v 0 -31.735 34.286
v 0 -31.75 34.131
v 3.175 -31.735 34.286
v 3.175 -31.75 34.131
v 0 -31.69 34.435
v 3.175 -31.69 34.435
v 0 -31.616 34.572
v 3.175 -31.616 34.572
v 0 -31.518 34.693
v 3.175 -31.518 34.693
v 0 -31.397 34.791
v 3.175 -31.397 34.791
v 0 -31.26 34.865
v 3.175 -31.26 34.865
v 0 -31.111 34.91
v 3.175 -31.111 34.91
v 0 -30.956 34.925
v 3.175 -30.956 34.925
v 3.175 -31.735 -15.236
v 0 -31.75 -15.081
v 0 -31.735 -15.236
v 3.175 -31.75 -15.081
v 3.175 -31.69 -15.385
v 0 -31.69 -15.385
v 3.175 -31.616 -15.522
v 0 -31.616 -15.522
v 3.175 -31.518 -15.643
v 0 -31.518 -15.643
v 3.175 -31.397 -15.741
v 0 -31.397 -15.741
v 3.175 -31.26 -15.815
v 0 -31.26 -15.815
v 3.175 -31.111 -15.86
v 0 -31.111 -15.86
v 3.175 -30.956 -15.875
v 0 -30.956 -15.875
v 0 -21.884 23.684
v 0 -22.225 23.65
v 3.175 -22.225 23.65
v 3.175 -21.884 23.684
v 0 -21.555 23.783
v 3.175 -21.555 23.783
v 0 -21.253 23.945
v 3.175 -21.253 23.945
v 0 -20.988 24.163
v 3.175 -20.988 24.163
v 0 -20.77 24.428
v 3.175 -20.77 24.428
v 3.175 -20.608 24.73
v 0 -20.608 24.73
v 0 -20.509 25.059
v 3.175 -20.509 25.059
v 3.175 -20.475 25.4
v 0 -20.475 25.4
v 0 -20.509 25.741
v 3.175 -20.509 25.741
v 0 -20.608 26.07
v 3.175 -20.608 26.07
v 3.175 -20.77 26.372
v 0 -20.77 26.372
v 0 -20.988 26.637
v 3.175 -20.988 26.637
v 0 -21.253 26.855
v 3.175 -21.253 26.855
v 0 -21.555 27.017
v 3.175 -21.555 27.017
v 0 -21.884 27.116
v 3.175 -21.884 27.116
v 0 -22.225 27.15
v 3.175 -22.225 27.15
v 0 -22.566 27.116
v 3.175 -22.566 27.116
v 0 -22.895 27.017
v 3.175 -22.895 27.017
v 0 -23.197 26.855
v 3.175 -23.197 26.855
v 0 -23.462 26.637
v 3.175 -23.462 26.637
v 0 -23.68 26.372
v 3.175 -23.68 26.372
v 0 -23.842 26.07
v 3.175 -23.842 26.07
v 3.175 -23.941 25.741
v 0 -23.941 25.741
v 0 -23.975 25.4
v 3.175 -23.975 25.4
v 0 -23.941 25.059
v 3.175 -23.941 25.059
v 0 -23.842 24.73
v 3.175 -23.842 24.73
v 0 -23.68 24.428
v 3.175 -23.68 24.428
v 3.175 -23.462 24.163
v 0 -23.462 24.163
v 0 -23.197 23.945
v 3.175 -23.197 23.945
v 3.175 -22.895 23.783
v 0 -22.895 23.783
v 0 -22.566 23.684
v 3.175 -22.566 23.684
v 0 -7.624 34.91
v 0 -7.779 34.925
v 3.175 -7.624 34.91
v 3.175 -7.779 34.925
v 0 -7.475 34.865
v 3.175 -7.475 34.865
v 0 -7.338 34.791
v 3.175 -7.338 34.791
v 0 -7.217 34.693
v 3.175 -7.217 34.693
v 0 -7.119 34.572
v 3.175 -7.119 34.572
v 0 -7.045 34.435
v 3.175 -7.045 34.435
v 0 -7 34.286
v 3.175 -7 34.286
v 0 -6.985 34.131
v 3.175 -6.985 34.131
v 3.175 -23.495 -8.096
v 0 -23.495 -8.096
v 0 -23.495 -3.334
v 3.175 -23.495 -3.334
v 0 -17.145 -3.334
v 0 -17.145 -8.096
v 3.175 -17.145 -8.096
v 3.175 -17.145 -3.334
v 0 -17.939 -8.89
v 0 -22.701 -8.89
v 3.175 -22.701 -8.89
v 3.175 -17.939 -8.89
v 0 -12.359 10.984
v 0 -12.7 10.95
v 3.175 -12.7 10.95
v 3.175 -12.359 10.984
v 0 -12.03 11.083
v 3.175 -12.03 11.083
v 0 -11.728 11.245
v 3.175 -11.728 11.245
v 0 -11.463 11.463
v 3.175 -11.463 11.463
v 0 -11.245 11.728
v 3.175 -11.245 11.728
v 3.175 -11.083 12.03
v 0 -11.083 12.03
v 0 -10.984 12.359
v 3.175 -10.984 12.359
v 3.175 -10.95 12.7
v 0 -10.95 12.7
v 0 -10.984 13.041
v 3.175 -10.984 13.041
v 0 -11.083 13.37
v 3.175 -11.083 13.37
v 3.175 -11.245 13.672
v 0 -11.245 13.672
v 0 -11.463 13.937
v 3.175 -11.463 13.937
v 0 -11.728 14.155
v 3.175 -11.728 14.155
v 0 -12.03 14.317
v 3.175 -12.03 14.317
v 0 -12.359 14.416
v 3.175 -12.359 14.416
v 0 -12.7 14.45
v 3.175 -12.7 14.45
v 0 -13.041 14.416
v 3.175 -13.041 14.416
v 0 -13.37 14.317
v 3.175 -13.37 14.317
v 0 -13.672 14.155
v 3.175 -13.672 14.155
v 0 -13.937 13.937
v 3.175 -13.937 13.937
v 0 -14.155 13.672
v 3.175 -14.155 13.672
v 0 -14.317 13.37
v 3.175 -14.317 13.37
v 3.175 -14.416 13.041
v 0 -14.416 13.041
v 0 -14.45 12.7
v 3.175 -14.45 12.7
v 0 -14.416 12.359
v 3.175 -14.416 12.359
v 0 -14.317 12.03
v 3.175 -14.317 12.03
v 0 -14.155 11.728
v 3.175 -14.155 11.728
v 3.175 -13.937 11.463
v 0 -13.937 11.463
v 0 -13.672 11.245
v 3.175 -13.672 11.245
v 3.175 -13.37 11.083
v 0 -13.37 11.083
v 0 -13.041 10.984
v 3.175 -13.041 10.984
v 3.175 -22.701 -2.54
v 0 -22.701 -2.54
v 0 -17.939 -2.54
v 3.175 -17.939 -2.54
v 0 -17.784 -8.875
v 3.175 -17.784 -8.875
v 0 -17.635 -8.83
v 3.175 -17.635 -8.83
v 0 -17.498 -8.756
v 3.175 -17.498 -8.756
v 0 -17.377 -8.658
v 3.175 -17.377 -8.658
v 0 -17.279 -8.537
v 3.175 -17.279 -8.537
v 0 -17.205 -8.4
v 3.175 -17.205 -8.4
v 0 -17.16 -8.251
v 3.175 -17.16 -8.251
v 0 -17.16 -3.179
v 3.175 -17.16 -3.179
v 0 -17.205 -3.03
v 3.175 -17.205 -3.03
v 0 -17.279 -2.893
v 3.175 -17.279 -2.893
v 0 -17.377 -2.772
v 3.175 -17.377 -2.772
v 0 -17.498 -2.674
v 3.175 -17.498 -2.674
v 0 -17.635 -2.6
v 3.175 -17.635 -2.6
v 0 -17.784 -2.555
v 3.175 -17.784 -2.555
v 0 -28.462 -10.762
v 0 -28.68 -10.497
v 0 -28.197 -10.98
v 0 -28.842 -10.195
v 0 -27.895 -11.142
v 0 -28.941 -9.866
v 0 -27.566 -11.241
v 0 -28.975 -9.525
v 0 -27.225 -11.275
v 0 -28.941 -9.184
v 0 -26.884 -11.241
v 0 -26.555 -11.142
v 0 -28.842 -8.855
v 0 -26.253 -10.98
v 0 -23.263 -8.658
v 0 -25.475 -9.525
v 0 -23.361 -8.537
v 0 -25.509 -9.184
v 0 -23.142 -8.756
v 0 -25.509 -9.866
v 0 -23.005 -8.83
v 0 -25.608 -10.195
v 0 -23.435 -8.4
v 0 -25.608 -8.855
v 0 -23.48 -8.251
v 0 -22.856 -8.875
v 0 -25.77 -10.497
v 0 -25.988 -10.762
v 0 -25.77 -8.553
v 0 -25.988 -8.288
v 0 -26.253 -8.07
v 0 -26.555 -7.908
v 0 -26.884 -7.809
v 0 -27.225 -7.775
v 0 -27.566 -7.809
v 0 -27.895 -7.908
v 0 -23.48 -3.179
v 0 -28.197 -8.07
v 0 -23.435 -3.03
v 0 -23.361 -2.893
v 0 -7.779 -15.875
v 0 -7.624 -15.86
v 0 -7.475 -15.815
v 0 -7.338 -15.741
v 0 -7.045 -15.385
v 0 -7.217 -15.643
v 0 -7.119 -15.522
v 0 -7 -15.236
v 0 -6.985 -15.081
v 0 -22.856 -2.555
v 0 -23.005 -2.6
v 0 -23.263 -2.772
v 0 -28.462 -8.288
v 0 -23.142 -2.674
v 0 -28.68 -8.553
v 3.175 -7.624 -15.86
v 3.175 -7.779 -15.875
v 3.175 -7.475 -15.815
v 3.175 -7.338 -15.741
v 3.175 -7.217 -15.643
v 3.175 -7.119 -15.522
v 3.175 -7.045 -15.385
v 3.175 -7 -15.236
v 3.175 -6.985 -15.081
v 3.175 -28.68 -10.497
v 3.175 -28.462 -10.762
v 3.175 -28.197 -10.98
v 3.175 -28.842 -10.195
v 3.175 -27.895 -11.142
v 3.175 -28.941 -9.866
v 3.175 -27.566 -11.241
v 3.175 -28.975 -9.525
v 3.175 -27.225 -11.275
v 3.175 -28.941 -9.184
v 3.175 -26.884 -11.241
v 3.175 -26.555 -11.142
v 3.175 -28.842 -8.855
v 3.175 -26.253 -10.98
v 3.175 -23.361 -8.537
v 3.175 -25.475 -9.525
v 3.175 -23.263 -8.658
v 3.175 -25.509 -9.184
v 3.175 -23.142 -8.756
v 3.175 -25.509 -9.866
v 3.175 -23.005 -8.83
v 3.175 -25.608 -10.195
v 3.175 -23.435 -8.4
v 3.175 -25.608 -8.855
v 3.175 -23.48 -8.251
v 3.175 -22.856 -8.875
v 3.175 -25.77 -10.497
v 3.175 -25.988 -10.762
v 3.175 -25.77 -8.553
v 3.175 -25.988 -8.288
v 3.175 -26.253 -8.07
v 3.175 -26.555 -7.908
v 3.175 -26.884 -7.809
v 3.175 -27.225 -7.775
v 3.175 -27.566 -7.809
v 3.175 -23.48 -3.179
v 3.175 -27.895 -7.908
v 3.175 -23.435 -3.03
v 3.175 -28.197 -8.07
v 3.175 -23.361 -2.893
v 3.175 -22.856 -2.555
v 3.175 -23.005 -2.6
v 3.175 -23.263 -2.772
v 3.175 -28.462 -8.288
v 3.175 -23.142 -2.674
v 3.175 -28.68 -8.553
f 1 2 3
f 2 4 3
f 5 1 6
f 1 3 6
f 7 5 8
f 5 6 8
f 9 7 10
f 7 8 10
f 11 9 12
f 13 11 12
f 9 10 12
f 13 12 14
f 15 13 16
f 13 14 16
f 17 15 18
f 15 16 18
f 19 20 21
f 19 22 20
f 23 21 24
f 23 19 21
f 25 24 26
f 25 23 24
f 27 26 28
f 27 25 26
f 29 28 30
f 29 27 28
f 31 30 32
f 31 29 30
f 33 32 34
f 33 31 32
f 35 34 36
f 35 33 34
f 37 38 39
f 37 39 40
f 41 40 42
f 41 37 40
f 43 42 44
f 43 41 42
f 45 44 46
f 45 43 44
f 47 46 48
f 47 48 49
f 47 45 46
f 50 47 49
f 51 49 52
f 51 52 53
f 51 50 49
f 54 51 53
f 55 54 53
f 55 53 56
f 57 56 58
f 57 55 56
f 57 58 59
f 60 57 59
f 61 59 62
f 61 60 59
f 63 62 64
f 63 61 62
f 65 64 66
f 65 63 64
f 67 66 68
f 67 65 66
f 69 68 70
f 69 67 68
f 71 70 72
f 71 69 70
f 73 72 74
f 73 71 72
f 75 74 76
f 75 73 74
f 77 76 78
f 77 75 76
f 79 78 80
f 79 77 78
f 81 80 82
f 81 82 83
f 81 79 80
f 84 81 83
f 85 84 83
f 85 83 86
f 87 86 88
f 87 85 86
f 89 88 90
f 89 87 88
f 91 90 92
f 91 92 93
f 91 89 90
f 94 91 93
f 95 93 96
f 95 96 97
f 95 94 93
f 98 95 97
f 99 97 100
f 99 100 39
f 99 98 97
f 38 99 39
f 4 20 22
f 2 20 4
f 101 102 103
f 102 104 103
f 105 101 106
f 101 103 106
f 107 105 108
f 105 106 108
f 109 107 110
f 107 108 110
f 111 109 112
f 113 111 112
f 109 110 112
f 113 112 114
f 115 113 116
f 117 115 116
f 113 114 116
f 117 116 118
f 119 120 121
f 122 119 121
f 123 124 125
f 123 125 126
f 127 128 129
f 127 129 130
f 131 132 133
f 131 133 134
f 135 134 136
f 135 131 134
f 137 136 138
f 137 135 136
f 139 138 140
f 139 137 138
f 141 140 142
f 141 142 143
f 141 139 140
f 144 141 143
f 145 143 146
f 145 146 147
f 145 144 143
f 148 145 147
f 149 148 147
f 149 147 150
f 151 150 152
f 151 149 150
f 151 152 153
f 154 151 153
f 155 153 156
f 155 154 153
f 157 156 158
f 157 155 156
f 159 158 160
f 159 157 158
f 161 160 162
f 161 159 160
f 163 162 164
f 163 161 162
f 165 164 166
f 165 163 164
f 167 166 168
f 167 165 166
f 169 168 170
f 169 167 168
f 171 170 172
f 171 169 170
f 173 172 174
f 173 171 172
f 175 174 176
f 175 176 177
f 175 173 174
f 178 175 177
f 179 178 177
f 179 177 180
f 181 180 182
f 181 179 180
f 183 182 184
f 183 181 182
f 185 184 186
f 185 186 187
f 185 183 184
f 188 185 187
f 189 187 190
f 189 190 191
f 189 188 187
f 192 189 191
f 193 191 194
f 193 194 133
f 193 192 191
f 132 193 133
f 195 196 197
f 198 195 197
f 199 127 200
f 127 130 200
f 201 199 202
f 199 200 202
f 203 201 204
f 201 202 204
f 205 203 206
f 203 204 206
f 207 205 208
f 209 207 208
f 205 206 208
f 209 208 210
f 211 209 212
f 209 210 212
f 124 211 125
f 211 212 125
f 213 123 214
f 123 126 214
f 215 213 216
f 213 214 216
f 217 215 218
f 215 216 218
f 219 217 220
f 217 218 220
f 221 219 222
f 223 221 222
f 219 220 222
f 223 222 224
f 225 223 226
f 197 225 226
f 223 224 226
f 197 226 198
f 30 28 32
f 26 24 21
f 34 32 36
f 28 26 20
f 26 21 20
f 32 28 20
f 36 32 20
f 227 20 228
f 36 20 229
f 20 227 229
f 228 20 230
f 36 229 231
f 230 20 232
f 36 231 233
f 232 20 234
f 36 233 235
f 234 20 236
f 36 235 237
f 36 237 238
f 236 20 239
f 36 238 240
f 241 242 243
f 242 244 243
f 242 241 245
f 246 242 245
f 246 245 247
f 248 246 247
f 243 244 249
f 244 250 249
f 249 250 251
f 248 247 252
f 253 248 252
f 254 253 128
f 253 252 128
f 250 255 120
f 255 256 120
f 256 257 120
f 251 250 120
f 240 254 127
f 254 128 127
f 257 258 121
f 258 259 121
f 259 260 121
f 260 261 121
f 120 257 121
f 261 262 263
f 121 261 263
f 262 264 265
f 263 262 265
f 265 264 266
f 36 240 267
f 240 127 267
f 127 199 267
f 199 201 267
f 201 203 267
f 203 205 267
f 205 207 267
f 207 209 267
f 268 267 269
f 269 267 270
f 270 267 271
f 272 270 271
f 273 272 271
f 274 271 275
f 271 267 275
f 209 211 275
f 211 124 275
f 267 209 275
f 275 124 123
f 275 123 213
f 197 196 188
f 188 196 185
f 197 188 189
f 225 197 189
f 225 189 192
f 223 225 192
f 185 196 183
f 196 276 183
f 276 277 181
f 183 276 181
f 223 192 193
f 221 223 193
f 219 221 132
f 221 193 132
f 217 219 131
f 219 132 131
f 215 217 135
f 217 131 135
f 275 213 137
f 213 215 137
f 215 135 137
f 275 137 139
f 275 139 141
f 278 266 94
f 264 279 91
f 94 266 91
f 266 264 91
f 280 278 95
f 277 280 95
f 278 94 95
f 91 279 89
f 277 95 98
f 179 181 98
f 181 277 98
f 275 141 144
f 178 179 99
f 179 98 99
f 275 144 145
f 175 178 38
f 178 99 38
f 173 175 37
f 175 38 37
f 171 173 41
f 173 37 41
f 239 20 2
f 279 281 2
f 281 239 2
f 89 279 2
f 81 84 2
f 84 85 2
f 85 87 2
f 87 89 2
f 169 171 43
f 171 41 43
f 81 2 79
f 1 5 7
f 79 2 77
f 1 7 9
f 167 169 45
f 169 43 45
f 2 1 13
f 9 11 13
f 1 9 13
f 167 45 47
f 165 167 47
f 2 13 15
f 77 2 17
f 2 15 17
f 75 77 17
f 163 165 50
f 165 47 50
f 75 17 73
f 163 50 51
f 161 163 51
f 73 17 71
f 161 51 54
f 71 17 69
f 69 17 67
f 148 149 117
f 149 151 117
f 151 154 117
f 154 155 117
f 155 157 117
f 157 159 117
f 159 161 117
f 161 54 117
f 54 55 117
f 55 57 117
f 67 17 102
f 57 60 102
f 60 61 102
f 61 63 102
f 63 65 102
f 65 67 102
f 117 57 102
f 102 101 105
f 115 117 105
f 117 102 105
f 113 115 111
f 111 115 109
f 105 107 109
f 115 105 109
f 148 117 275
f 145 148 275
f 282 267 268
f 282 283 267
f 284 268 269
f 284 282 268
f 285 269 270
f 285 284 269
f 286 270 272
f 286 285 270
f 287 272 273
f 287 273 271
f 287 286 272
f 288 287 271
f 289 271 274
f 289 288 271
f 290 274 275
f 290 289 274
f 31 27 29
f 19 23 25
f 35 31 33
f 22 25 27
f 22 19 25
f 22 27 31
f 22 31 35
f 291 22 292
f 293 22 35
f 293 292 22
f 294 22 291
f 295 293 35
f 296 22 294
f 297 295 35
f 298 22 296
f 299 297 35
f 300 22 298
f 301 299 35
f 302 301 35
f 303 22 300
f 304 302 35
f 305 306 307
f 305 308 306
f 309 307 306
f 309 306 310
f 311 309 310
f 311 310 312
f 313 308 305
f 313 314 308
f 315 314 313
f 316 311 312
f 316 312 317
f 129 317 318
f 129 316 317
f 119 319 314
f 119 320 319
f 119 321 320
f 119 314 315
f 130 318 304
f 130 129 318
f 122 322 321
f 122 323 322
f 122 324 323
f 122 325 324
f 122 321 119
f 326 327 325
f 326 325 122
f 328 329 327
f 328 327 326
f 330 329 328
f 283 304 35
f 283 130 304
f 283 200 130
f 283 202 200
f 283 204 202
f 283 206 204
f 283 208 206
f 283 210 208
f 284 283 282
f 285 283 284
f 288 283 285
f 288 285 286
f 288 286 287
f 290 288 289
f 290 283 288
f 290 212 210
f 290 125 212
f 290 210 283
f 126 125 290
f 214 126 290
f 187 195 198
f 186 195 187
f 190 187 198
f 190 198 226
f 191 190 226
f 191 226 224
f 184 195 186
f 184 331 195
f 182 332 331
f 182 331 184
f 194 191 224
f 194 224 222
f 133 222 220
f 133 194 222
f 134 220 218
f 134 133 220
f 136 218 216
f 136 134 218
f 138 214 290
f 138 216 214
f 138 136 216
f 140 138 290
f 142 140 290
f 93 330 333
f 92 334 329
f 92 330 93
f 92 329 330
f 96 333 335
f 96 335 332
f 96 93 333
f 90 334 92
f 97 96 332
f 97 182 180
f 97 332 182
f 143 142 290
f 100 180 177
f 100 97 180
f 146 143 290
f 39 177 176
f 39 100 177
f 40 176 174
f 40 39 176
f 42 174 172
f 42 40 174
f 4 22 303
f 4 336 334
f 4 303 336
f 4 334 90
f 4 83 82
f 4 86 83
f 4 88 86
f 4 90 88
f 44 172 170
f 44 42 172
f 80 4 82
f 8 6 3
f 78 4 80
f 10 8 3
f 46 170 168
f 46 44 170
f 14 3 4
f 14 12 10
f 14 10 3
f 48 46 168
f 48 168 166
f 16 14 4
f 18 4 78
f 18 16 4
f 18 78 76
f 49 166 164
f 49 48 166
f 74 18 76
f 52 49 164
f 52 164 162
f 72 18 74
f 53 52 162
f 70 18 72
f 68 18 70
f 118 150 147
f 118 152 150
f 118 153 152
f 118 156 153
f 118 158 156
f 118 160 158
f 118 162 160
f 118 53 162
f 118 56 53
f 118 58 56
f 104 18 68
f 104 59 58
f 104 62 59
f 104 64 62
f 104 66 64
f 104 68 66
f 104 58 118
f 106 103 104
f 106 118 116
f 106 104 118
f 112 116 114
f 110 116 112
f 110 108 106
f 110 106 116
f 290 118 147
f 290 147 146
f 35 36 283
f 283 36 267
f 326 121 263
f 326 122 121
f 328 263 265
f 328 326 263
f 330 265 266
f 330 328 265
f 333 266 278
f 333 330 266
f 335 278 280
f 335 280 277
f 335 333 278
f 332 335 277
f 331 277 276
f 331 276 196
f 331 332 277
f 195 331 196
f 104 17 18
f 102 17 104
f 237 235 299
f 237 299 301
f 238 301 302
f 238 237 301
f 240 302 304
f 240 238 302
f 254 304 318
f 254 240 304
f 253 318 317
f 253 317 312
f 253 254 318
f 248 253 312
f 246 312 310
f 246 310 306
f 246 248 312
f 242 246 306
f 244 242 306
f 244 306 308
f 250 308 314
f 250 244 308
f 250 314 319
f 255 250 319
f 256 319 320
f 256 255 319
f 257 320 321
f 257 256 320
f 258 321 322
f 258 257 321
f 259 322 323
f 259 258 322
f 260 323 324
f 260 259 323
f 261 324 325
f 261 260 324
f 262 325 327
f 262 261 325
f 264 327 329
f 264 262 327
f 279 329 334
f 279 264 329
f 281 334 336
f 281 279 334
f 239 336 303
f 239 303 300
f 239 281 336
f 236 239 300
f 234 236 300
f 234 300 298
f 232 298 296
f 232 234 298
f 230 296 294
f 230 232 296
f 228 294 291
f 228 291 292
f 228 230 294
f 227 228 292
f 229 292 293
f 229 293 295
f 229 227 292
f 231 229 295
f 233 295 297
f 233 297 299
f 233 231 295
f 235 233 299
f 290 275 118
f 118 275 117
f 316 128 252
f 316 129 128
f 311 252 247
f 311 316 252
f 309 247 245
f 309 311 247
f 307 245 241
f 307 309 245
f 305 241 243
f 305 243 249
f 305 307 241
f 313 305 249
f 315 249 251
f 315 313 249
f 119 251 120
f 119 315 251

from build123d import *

# Parameters (mm, degrees)
SKETCH1_W           = 24.765
SKETCH1_H           = 50.8
SKETCH1_R           = 1.75
SKETCH1_W_2         = 6.35
SKETCH1_H_2         = 6.35
BOSS_EXTRUDE1_DEPTH = 3.175
FILLET1_R           = 0.79375


with BuildPart() as part:
    # Sketch1 → Boss-Extrude1 (new body)
    with BuildSketch(Plane.YZ):
        with Locations((-19.3675, 9.525)):
            Rectangle(SKETCH1_W, SKETCH1_H)
        with Locations(Location((-27.225, -9.525, 0), (0, 0, 270))):
            Circle(SKETCH1_R, mode=Mode.SUBTRACT)
        with Locations((-20.32, -5.715)):
            Rectangle(SKETCH1_W_2, SKETCH1_H_2, mode=Mode.SUBTRACT)
        with Locations(Location((-12.7, 12.7, 0), (0, 0, 270))):
            Circle(SKETCH1_R, mode=Mode.SUBTRACT)
        with Locations(Location((-22.225, 25.4, 0), (0, 0, 270))):
            Circle(SKETCH1_R, mode=Mode.SUBTRACT)
    extrude(amount=BOSS_EXTRUDE1_DEPTH)

    # Fillet1
    fillet1_edges = [part.edges().sort_by_distance(p)[0] for p in [
        (1.5875, -23.495, -2.54),
        (1.5875, -23.495, -8.89),
        (1.5875, -17.145, -8.89),
        (1.5875, -17.145, -2.54),
        (1.5875, -6.985, -15.875),
        (1.5875, -31.75, -15.875),
        (1.5875, -31.75, 34.925),
        (1.5875, -6.985, 34.925),
    ]]
    fillet(fillet1_edges, radius=FILLET1_R)


solid = part.part
